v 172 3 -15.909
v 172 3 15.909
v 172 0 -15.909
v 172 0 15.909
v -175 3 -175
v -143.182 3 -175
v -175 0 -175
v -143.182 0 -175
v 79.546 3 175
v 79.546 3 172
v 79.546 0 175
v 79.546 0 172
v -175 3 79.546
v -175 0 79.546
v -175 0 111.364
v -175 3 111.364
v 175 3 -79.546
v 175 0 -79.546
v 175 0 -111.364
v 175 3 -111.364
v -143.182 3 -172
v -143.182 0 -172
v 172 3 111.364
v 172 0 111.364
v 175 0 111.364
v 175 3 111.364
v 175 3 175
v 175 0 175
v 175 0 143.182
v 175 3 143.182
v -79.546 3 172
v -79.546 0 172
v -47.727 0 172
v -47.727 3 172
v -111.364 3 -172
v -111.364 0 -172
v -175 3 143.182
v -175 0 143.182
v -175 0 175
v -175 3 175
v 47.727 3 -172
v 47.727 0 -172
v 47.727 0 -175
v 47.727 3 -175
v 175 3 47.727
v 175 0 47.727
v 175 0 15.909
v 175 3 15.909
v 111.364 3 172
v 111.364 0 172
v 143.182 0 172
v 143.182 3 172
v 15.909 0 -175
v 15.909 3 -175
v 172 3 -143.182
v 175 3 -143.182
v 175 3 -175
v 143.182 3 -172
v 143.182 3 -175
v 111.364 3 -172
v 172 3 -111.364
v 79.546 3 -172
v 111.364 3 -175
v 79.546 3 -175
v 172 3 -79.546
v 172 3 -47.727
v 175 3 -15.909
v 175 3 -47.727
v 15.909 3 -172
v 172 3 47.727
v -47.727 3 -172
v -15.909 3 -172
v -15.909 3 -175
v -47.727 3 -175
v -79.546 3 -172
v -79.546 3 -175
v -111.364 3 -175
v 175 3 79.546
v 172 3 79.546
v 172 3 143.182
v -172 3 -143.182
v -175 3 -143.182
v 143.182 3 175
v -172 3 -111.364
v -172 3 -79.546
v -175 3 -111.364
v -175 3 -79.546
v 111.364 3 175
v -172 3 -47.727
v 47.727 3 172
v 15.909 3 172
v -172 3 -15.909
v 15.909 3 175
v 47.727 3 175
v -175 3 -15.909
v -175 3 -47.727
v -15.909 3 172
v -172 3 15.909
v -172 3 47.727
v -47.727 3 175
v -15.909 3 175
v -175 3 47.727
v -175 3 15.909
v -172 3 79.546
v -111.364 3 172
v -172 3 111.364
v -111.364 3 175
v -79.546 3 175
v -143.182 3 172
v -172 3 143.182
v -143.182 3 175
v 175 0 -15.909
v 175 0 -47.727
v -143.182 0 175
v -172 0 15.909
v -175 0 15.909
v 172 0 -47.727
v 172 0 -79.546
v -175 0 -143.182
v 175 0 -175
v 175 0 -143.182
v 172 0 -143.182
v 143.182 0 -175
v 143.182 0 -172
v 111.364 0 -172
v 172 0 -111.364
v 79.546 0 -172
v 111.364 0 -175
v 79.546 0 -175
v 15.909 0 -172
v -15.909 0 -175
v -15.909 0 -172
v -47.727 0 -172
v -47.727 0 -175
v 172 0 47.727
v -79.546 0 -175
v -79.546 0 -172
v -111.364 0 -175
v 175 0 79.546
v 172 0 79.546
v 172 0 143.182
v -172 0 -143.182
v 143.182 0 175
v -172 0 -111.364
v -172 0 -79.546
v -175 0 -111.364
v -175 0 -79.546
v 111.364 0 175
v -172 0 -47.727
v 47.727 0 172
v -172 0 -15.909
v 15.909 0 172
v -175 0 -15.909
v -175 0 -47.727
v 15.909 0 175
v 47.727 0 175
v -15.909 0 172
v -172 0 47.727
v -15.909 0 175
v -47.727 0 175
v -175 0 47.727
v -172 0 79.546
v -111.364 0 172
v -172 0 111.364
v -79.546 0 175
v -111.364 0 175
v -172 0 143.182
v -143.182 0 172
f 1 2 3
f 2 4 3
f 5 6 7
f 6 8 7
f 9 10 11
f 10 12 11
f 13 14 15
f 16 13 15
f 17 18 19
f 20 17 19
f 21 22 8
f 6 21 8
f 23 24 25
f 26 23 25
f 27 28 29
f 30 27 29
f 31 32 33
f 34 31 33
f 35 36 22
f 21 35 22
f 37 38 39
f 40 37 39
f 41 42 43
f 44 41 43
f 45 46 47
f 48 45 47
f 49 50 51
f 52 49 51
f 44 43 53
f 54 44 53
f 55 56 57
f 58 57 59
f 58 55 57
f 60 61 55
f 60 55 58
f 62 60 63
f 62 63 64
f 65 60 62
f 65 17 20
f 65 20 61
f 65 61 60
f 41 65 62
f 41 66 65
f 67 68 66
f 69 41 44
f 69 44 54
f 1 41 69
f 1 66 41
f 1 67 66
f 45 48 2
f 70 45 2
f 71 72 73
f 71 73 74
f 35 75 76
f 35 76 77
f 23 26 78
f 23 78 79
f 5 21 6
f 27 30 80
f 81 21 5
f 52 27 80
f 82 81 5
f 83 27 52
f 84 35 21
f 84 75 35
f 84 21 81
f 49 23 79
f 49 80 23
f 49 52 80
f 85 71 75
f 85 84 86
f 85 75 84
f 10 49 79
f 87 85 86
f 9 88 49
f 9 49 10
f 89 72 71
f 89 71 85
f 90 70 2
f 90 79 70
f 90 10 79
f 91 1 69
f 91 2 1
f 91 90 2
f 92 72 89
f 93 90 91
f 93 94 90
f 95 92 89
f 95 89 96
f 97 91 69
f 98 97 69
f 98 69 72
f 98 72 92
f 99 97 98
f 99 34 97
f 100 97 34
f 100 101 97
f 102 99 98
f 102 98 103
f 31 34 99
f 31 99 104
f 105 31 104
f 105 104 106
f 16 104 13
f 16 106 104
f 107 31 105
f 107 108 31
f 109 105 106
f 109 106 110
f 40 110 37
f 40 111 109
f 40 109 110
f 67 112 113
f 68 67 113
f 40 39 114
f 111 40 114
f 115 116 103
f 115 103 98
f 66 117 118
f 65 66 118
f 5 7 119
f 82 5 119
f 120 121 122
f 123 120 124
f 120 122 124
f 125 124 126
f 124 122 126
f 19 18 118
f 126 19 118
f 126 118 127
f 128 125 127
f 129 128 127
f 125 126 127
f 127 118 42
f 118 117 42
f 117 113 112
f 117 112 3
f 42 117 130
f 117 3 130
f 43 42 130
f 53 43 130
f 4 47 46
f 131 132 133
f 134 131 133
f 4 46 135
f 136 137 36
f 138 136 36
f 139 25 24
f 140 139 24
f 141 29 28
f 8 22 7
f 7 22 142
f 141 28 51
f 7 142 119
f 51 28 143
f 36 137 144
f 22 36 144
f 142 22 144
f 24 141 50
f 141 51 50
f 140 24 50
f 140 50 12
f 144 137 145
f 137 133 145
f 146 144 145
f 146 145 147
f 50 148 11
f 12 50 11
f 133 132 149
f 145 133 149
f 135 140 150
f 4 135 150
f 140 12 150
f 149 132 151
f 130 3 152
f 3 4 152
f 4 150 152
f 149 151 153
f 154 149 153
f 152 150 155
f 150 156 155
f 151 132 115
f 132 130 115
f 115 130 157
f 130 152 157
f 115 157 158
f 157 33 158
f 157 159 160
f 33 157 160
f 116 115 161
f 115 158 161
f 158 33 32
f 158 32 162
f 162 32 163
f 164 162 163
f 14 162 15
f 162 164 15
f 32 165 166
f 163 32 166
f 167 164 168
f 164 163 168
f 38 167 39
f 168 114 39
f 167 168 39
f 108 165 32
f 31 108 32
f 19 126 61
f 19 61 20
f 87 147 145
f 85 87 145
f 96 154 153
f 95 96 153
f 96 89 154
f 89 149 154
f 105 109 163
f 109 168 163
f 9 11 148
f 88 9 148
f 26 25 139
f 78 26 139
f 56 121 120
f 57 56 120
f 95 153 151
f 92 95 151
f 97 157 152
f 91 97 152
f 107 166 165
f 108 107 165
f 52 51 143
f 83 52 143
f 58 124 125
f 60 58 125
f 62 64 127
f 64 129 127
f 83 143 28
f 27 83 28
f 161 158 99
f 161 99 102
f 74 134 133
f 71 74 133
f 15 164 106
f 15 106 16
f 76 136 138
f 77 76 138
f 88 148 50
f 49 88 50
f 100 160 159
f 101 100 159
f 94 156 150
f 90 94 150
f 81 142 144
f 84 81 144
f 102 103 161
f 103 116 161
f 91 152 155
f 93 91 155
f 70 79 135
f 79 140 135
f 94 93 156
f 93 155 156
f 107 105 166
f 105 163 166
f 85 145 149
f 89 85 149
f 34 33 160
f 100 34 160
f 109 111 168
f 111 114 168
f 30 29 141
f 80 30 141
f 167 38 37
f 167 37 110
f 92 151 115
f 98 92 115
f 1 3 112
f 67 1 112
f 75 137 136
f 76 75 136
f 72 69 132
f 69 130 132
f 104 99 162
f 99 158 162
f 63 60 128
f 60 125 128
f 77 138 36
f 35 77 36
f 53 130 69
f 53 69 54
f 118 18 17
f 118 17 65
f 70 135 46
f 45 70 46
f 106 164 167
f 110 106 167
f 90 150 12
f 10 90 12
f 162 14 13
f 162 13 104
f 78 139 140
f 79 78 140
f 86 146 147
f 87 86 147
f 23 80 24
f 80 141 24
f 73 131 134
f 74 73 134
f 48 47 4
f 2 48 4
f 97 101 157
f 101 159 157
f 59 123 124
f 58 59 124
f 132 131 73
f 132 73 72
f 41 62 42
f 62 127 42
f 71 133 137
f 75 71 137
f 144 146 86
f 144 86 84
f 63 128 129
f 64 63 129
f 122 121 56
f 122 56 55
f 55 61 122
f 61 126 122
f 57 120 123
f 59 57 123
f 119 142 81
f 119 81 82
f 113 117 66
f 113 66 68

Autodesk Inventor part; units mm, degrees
ref_plane "YZ Plane" through (0, 0, 0) normal (1, 0, 0) x (0, 1, 0)
ref_plane "XZ Plane" through (0, 0, 0) normal (0, 1, 0) x (-1, 0, 0)
ref_plane "XY Plane" through (0, 0, 0) normal (0, 0, 1) x (1, 0, 0)
sketch "Sketch1" plane through (0, 0, 0) normal (0, 1, 0) x (-1, 0, 0)
  line L0 (143.1818, 175) -> (143.1818, 172)
  line L1 (111.3636, 172) -> (111.3636, 175)
  line L2 (79.5455, 175) -> (79.5455, 172)
  line L3 (47.7273, 172) -> (47.7273, 175)
  line L4 (15.9091, 175) -> (15.9091, 172)
  line L5 (-15.9091, 172) -> (-15.9091, 175)
  line L6 (-47.7273, 175) -> (-47.7273, 172)
  line L7 (-79.5455, 172) -> (-79.5455, 175)
  line L8 (-111.3636, 175) -> (-111.3636, 172)
  line L9 (-143.1818, 172) -> (-143.1818, 175)
  line L10 (-175, 143.1818) -> (-172, 143.1818)
  line L11 (-172, 111.3636) -> (-175, 111.3636)
  line L12 (-175, 79.5455) -> (-172, 79.5455)
  line L13 (-172, 47.7273) -> (-175, 47.7273)
  line L14 (-175, 15.9091) -> (-172, 15.9091)
  line L15 (-172, -15.9091) -> (-175, -15.9091)
  line L16 (-172, -47.7273) -> (-175, -47.7273)
  line L17 (-175, -79.5455) -> (-172, -79.5455)
  line L18 (-172, -111.3636) -> (-175, -111.3636)
  line L19 (-175, -143.1818) -> (-172, -143.1818)
  line L20 (-143.1818, -175) -> (-143.1818, -172)
  line L21 (-111.3636, -172) -> (-111.3636, -175)
  line L22 (-79.5455, -175) -> (-79.5455, -172)
  line L23 (-47.7273, -172) -> (-47.7273, -175)
  line L24 (-15.9091, -172) -> (-15.9091, -175)
  line L25 (15.9091, -175) -> (15.9091, -172)
  line L26 (143.1818, -172) -> (143.1818, -175)
  line L27 (111.3636, -175) -> (111.3636, -172)
  line L28 (79.5455, -172) -> (79.5455, -175)
  line L29 (47.7273, -175) -> (47.7273, -172)
  line L30 (172, -143.1818) -> (175, -143.1818)
  line L31 (175, -111.3636) -> (172, -111.3636)
  line L32 (175, -79.5455) -> (172, -79.5455)
  line L33 (175, -15.9091) -> (172, -15.9091)
  line L34 (175, 15.9091) -> (172, 15.9091)
  line L35 (175, 143.1818) -> (172, 143.1818)
  line L36 (172, 111.3636) -> (175, 111.3636)
  line L37 (175, 79.5455) -> (172, 79.5455)
  line L38 (172, 47.7273) -> (175, 47.7273)
  line L39 (111.3636, -172) -> (143.1818, -172)
  line L40 (47.7273, -172) -> (79.5455, -172)
  line L41 (-15.9091, -172) -> (15.9091, -172)
  line L42 (172, -143.1818) -> (172, -111.3636)
  line L43 (172, -15.9091) -> (172, 15.9091)
  line L44 (172, 47.7273) -> (172, 79.5455)
  line L45 (172, 111.3636) -> (172, 143.1818)
  line L46 (143.1818, 172) -> (111.3636, 172)
  line L47 (79.5455, 172) -> (47.7273, 172)
  line L48 (15.9091, 172) -> (-15.9091, 172)
  line L49 (-47.7273, 172) -> (-79.5455, 172)
  line L50 (-111.3636, 172) -> (-143.1818, 172)
  line L51 (-172, 143.1818) -> (-172, 111.3636)
  line L52 (-172, 79.5455) -> (-172, 47.7273)
  line L53 (-172, 15.9091) -> (-172, -15.9091)
  line L54 (-175, 47.7273) -> (-175, 15.9091)
  line L55 (-175, 175) -> (-175, 143.1818)
  line L56 (-175, 111.3636) -> (-175, 79.5455)
  line L57 (-143.1818, -172) -> (-111.3636, -172)
  line L58 (-79.5455, -172) -> (-47.7273, -172)
  line L59 (-172, -47.7273) -> (-172, -79.5455)
  line L60 (-172, -111.3636) -> (-172, -143.1818)
  line L61 (-175, -15.9091) -> (-175, -47.7273)
  line L62 (-175, -79.5455) -> (-175, -111.3636)
  line L63 (-175, -143.1818) -> (-175, -175)
  line L64 (-175, -175) -> (-143.1818, -175)
  line L65 (-111.3636, -175) -> (-79.5455, -175)
  line L66 (-47.7273, -175) -> (-15.9091, -175)
  line L67 (15.9091, -175) -> (47.7273, -175)
  line L68 (79.5455, -175) -> (111.3636, -175)
  line L69 (143.1818, -175) -> (175, -175)
  line L70 (175, -175) -> (175, -143.1818)
  line L71 (175, 15.9091) -> (175, 47.7273)
  line L72 (175, 79.5455) -> (175, 111.3636)
  line L73 (175, 143.1818) -> (175, 175)
  line L74 (175, 175) -> (143.1818, 175)
  line L75 (111.3636, 175) -> (79.5455, 175)
  line L76 (47.7273, 175) -> (15.9091, 175)
  line L77 (-15.9091, 175) -> (-47.7273, 175)
  line L78 (-79.5455, 175) -> (-111.3636, 175)
  line L79 (-143.1818, 175) -> (-175, 175)
  line L80 (172, -79.5455) -> (172, -47.7273)
  line L81 (172, -47.7273) -> (175, -47.7273)
  line L82 (175, -111.3636) -> (175, -79.5455)
  line L83 (175, -47.7273) -> (175, -15.9091)
  point P0 (0, 0)
  dimension "d1" = 350
  dimension "d3" = 350
  dimension "d5" = 175
  dimension "d6" = 175
  dimension "d7" = 3
  dimension "d8" = 3
  dimension "d9" = 3
  dimension "d10" = 3
extrude "Extrusion1" add sketch "Sketch1" along normal blind 3
equation "\"d1\" = wt"
equation "\"d3\" = lt"
equation "\"d5\" = 0.5 * lt"
equation "\"d6\" = 0.5 * wt"
equation "\"d7\" = tt"
equation "\"d8\" = tt"
equation "\"d9\" = tt"
equation "\"d10\" = tt"
equation "\"d13\" = tt"
equation "\"wt\" = 350"
equation "\"tt\" = 3"
equation "\"tol\" = 0"
equation "\"tiroir\" = 25.4"
equation "\"nHoles\" = 101.6"
equation "\"shelfH\" = 35"
equation "\"d0\" = 0.5 * wt"
equation "\"d2\" = 0.5 * lt"
equation "\"lt\" = 350"
equation "\"d4\" = tt"
properties part number "base"
